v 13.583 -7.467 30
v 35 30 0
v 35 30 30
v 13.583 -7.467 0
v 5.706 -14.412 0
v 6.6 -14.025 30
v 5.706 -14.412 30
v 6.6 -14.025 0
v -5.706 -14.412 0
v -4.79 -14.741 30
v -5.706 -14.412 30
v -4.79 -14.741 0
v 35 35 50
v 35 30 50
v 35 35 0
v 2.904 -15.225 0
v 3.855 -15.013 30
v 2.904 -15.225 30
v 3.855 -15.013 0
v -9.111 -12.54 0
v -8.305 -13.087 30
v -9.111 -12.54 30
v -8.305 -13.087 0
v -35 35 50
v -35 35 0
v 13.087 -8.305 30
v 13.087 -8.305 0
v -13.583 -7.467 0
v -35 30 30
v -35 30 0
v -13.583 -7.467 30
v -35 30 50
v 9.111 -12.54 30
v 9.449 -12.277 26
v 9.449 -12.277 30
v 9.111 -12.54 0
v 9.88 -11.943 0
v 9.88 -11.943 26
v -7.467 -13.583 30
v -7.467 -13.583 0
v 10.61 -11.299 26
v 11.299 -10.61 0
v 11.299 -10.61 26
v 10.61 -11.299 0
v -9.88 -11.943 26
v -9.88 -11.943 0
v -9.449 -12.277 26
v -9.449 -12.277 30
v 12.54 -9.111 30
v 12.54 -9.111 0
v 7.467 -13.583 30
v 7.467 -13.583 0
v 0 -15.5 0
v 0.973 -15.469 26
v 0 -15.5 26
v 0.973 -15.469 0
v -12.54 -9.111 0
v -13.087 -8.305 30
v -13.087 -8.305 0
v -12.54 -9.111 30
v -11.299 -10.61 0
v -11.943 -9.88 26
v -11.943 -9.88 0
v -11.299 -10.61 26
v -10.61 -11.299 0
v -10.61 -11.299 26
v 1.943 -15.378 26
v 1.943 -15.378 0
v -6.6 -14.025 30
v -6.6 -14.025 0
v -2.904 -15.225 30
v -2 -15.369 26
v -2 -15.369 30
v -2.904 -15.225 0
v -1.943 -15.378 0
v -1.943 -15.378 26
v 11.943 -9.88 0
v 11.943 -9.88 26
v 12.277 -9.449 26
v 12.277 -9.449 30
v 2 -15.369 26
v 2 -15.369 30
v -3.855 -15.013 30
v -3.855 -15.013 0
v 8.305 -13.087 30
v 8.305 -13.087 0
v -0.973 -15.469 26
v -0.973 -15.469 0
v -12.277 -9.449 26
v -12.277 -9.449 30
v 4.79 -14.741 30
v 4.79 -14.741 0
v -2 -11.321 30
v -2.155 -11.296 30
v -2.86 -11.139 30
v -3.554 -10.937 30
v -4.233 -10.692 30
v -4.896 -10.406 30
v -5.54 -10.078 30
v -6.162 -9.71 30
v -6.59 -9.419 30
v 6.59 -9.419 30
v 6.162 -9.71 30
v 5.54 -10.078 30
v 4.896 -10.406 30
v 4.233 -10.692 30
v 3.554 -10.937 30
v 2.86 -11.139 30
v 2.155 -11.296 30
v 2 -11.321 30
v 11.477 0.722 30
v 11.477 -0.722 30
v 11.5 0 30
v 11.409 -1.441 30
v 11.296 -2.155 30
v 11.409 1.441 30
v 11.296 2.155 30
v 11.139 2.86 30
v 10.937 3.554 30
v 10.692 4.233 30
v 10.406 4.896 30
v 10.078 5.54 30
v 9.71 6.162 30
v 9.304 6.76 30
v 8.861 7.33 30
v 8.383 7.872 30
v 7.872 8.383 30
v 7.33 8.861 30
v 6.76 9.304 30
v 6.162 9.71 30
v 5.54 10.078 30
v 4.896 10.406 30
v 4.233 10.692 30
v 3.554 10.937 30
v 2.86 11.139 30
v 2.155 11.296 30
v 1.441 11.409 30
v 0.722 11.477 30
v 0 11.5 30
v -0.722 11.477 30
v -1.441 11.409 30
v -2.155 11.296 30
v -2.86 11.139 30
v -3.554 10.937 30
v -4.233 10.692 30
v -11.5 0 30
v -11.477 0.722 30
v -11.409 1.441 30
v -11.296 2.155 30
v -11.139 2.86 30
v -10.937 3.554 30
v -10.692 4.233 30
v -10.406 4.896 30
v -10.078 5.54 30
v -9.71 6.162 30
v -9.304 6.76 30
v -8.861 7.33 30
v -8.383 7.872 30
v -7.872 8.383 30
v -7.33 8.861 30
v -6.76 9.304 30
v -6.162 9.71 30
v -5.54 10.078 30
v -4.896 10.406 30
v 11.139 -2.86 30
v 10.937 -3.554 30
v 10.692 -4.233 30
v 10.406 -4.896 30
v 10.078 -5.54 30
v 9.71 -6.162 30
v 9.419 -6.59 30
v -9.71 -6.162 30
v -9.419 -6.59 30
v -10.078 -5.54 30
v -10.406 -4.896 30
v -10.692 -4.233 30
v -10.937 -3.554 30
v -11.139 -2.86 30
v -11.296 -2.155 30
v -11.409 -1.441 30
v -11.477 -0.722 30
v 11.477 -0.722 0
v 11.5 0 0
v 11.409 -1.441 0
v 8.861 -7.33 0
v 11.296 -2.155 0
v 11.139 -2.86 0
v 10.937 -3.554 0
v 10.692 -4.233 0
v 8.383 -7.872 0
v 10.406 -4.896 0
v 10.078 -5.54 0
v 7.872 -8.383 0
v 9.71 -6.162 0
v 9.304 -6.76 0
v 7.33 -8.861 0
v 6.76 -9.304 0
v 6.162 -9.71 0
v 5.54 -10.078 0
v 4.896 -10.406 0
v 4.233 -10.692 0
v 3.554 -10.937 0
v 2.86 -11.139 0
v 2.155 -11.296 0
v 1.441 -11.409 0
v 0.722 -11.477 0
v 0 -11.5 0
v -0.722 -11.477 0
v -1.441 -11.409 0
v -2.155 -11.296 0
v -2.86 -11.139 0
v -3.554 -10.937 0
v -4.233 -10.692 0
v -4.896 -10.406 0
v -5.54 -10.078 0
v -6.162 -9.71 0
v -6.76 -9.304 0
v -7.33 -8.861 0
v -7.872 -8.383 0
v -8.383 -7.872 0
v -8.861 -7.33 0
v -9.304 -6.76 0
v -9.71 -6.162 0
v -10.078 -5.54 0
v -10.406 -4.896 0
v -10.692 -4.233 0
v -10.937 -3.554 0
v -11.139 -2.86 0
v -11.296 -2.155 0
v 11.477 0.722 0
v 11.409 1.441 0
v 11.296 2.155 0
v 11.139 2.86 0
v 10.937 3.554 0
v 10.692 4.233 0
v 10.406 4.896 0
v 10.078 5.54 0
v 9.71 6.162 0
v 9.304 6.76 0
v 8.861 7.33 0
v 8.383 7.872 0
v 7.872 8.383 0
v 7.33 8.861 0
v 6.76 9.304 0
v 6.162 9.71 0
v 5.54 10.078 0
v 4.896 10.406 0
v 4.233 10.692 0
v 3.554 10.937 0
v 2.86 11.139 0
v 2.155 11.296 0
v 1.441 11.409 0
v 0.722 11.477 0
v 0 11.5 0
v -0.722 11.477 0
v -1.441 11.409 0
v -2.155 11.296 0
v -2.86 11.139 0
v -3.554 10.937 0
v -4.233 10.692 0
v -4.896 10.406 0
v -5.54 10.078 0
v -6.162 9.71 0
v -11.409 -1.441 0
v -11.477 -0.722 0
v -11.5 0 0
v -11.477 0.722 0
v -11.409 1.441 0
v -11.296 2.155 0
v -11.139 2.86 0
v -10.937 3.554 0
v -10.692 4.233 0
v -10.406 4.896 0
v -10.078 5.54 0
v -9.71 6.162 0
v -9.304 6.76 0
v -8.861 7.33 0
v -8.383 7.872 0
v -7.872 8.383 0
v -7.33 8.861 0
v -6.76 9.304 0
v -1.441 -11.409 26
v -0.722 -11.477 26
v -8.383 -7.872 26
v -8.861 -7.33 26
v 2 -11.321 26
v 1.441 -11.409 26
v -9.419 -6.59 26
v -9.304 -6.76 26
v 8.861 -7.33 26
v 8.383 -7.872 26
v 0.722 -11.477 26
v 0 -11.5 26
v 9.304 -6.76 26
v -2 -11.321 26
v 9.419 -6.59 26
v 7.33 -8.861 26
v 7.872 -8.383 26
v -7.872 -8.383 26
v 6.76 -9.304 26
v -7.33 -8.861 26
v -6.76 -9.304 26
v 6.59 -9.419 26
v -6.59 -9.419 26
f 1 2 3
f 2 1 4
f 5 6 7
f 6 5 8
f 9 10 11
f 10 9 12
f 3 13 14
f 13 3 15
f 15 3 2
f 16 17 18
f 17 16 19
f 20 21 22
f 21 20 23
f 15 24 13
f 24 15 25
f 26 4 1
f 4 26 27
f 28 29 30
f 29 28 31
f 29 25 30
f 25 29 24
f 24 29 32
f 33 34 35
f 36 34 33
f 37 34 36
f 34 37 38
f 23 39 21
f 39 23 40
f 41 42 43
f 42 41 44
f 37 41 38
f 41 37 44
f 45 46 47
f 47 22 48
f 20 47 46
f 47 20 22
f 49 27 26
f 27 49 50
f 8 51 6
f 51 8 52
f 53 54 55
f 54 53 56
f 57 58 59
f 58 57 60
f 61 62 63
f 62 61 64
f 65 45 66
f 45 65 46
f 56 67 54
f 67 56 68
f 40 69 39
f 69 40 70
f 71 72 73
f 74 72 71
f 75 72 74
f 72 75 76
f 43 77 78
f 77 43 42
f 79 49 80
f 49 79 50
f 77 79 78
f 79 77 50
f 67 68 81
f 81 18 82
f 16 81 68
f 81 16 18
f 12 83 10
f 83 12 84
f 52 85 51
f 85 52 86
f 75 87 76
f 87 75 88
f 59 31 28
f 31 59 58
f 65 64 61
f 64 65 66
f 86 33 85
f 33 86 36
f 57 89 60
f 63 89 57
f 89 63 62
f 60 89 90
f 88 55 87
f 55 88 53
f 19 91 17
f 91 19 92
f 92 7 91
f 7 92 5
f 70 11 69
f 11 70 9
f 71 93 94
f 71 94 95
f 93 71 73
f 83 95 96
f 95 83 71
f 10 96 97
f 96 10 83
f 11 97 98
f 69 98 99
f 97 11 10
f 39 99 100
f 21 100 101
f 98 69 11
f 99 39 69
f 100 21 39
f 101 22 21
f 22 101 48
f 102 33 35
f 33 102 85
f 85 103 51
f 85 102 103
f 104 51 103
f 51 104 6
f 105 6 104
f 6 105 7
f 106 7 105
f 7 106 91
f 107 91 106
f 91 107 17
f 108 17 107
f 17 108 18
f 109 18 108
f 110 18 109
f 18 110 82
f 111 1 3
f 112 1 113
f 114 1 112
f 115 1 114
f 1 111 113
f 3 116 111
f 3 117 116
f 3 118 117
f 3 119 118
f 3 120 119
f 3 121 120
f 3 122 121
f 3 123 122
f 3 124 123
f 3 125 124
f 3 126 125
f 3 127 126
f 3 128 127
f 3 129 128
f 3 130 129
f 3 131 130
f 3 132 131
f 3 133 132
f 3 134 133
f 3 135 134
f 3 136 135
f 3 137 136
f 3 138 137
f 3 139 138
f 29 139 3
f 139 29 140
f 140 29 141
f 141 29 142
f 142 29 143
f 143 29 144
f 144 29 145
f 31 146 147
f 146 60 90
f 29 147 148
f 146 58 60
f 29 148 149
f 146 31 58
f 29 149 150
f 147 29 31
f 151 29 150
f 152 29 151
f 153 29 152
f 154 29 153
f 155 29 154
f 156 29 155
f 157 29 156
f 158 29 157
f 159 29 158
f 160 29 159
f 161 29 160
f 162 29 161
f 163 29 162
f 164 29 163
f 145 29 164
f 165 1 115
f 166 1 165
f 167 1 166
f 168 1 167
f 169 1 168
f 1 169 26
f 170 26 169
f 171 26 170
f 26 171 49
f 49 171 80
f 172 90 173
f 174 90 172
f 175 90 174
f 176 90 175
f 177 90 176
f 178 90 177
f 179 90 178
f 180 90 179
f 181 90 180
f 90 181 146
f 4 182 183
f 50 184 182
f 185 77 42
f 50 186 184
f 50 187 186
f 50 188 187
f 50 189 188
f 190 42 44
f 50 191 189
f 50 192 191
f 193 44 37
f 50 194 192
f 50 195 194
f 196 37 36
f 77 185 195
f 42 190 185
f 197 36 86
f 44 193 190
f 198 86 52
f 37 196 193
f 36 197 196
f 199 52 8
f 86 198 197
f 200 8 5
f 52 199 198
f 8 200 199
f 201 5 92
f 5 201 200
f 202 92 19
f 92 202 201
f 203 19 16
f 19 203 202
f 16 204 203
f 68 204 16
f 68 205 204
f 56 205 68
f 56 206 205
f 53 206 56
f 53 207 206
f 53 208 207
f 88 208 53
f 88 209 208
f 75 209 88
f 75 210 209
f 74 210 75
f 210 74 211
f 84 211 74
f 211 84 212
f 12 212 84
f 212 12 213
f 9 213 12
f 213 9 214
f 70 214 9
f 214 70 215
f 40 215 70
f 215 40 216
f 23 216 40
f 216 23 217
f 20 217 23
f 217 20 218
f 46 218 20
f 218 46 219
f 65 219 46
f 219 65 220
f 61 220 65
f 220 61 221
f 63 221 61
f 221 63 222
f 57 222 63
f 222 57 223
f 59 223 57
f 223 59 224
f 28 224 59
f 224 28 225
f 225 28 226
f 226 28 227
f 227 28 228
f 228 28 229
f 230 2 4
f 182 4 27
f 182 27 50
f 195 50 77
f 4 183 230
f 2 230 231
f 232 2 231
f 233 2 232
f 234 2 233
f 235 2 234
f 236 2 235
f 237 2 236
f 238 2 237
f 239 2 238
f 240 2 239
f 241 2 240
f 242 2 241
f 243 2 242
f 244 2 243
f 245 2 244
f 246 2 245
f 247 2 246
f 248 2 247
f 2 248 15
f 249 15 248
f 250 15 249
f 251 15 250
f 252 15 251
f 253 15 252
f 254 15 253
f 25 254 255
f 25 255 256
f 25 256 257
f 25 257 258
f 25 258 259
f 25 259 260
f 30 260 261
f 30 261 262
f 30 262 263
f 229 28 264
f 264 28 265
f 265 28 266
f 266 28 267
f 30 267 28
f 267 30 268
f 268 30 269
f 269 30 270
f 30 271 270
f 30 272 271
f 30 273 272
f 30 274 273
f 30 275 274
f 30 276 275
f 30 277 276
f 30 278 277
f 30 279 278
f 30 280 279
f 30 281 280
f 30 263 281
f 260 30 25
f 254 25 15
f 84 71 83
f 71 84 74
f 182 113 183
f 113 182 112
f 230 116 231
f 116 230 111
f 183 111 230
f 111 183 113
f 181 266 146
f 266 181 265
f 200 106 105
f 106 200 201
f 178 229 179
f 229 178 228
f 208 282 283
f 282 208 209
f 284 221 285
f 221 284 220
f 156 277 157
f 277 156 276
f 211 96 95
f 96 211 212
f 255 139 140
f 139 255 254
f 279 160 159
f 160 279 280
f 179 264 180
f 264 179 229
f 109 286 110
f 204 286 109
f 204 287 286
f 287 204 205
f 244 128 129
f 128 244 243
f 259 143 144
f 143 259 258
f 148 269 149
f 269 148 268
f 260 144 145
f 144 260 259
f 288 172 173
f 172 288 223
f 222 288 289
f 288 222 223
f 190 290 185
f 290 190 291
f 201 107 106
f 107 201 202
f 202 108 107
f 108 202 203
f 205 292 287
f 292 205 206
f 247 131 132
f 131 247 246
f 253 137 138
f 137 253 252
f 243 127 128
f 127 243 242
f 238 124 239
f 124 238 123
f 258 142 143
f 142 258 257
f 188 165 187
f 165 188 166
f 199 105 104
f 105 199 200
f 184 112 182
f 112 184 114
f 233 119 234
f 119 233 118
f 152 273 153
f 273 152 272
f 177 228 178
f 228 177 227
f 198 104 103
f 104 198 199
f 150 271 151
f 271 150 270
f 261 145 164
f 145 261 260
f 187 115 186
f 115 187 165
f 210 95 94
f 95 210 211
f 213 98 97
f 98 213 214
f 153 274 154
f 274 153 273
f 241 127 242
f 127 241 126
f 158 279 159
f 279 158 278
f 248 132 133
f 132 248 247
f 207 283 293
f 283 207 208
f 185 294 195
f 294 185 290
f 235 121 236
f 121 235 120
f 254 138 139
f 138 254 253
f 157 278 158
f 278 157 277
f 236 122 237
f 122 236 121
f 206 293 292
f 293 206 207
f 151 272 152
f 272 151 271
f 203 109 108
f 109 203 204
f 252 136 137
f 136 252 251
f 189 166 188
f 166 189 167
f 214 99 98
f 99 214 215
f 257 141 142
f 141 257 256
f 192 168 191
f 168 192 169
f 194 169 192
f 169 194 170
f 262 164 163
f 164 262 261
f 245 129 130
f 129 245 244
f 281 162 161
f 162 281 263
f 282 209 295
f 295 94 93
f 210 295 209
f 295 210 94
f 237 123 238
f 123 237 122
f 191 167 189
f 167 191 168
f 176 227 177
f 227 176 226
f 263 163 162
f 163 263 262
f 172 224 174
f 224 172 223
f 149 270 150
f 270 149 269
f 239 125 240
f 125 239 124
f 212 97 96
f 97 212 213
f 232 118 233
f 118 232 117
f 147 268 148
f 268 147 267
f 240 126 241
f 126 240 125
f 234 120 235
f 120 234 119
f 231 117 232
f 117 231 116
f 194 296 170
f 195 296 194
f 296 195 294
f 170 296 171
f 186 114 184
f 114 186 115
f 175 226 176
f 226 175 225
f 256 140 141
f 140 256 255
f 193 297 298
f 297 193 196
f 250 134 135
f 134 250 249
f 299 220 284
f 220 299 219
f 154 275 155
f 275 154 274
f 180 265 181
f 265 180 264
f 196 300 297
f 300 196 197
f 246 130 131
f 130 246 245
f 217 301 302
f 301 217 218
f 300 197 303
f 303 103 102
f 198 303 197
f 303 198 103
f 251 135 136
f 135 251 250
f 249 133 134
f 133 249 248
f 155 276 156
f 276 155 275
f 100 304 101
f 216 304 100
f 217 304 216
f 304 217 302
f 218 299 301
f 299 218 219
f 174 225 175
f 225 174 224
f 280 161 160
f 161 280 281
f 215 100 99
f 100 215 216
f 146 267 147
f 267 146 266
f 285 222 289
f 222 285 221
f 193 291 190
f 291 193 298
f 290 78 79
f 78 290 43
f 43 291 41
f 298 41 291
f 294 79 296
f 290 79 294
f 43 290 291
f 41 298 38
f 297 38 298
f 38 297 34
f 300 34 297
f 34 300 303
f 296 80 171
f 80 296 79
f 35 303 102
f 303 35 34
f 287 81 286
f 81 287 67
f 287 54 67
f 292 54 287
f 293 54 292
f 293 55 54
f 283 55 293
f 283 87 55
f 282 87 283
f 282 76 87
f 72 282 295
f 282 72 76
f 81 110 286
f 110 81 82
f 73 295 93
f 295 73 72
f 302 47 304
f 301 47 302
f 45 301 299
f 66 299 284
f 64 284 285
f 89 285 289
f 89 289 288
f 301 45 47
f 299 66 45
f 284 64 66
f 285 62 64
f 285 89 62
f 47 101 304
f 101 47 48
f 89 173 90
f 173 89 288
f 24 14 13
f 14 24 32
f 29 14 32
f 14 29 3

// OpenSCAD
$fn=100;

difference() {	
	hull() {
		cylinder(r=15.5, h=30);
		translate([-35,30,0])cube([70,5,30]);
	}
	cylinder(r=11.5, h=30);
	
	// angle arretations
	#rotate ([0,0,-45]) translate([0,-2,30-4]) cube([30,4,4]);
	#rotate ([0,0,-90]) translate([0,-2,30-4]) cube([30,4,4]);
	#rotate ([0,0,-135]) translate([0,-2,30-4]) cube([30,4,4]);
}

translate([-35,30,0])cube([70,5,50]);
